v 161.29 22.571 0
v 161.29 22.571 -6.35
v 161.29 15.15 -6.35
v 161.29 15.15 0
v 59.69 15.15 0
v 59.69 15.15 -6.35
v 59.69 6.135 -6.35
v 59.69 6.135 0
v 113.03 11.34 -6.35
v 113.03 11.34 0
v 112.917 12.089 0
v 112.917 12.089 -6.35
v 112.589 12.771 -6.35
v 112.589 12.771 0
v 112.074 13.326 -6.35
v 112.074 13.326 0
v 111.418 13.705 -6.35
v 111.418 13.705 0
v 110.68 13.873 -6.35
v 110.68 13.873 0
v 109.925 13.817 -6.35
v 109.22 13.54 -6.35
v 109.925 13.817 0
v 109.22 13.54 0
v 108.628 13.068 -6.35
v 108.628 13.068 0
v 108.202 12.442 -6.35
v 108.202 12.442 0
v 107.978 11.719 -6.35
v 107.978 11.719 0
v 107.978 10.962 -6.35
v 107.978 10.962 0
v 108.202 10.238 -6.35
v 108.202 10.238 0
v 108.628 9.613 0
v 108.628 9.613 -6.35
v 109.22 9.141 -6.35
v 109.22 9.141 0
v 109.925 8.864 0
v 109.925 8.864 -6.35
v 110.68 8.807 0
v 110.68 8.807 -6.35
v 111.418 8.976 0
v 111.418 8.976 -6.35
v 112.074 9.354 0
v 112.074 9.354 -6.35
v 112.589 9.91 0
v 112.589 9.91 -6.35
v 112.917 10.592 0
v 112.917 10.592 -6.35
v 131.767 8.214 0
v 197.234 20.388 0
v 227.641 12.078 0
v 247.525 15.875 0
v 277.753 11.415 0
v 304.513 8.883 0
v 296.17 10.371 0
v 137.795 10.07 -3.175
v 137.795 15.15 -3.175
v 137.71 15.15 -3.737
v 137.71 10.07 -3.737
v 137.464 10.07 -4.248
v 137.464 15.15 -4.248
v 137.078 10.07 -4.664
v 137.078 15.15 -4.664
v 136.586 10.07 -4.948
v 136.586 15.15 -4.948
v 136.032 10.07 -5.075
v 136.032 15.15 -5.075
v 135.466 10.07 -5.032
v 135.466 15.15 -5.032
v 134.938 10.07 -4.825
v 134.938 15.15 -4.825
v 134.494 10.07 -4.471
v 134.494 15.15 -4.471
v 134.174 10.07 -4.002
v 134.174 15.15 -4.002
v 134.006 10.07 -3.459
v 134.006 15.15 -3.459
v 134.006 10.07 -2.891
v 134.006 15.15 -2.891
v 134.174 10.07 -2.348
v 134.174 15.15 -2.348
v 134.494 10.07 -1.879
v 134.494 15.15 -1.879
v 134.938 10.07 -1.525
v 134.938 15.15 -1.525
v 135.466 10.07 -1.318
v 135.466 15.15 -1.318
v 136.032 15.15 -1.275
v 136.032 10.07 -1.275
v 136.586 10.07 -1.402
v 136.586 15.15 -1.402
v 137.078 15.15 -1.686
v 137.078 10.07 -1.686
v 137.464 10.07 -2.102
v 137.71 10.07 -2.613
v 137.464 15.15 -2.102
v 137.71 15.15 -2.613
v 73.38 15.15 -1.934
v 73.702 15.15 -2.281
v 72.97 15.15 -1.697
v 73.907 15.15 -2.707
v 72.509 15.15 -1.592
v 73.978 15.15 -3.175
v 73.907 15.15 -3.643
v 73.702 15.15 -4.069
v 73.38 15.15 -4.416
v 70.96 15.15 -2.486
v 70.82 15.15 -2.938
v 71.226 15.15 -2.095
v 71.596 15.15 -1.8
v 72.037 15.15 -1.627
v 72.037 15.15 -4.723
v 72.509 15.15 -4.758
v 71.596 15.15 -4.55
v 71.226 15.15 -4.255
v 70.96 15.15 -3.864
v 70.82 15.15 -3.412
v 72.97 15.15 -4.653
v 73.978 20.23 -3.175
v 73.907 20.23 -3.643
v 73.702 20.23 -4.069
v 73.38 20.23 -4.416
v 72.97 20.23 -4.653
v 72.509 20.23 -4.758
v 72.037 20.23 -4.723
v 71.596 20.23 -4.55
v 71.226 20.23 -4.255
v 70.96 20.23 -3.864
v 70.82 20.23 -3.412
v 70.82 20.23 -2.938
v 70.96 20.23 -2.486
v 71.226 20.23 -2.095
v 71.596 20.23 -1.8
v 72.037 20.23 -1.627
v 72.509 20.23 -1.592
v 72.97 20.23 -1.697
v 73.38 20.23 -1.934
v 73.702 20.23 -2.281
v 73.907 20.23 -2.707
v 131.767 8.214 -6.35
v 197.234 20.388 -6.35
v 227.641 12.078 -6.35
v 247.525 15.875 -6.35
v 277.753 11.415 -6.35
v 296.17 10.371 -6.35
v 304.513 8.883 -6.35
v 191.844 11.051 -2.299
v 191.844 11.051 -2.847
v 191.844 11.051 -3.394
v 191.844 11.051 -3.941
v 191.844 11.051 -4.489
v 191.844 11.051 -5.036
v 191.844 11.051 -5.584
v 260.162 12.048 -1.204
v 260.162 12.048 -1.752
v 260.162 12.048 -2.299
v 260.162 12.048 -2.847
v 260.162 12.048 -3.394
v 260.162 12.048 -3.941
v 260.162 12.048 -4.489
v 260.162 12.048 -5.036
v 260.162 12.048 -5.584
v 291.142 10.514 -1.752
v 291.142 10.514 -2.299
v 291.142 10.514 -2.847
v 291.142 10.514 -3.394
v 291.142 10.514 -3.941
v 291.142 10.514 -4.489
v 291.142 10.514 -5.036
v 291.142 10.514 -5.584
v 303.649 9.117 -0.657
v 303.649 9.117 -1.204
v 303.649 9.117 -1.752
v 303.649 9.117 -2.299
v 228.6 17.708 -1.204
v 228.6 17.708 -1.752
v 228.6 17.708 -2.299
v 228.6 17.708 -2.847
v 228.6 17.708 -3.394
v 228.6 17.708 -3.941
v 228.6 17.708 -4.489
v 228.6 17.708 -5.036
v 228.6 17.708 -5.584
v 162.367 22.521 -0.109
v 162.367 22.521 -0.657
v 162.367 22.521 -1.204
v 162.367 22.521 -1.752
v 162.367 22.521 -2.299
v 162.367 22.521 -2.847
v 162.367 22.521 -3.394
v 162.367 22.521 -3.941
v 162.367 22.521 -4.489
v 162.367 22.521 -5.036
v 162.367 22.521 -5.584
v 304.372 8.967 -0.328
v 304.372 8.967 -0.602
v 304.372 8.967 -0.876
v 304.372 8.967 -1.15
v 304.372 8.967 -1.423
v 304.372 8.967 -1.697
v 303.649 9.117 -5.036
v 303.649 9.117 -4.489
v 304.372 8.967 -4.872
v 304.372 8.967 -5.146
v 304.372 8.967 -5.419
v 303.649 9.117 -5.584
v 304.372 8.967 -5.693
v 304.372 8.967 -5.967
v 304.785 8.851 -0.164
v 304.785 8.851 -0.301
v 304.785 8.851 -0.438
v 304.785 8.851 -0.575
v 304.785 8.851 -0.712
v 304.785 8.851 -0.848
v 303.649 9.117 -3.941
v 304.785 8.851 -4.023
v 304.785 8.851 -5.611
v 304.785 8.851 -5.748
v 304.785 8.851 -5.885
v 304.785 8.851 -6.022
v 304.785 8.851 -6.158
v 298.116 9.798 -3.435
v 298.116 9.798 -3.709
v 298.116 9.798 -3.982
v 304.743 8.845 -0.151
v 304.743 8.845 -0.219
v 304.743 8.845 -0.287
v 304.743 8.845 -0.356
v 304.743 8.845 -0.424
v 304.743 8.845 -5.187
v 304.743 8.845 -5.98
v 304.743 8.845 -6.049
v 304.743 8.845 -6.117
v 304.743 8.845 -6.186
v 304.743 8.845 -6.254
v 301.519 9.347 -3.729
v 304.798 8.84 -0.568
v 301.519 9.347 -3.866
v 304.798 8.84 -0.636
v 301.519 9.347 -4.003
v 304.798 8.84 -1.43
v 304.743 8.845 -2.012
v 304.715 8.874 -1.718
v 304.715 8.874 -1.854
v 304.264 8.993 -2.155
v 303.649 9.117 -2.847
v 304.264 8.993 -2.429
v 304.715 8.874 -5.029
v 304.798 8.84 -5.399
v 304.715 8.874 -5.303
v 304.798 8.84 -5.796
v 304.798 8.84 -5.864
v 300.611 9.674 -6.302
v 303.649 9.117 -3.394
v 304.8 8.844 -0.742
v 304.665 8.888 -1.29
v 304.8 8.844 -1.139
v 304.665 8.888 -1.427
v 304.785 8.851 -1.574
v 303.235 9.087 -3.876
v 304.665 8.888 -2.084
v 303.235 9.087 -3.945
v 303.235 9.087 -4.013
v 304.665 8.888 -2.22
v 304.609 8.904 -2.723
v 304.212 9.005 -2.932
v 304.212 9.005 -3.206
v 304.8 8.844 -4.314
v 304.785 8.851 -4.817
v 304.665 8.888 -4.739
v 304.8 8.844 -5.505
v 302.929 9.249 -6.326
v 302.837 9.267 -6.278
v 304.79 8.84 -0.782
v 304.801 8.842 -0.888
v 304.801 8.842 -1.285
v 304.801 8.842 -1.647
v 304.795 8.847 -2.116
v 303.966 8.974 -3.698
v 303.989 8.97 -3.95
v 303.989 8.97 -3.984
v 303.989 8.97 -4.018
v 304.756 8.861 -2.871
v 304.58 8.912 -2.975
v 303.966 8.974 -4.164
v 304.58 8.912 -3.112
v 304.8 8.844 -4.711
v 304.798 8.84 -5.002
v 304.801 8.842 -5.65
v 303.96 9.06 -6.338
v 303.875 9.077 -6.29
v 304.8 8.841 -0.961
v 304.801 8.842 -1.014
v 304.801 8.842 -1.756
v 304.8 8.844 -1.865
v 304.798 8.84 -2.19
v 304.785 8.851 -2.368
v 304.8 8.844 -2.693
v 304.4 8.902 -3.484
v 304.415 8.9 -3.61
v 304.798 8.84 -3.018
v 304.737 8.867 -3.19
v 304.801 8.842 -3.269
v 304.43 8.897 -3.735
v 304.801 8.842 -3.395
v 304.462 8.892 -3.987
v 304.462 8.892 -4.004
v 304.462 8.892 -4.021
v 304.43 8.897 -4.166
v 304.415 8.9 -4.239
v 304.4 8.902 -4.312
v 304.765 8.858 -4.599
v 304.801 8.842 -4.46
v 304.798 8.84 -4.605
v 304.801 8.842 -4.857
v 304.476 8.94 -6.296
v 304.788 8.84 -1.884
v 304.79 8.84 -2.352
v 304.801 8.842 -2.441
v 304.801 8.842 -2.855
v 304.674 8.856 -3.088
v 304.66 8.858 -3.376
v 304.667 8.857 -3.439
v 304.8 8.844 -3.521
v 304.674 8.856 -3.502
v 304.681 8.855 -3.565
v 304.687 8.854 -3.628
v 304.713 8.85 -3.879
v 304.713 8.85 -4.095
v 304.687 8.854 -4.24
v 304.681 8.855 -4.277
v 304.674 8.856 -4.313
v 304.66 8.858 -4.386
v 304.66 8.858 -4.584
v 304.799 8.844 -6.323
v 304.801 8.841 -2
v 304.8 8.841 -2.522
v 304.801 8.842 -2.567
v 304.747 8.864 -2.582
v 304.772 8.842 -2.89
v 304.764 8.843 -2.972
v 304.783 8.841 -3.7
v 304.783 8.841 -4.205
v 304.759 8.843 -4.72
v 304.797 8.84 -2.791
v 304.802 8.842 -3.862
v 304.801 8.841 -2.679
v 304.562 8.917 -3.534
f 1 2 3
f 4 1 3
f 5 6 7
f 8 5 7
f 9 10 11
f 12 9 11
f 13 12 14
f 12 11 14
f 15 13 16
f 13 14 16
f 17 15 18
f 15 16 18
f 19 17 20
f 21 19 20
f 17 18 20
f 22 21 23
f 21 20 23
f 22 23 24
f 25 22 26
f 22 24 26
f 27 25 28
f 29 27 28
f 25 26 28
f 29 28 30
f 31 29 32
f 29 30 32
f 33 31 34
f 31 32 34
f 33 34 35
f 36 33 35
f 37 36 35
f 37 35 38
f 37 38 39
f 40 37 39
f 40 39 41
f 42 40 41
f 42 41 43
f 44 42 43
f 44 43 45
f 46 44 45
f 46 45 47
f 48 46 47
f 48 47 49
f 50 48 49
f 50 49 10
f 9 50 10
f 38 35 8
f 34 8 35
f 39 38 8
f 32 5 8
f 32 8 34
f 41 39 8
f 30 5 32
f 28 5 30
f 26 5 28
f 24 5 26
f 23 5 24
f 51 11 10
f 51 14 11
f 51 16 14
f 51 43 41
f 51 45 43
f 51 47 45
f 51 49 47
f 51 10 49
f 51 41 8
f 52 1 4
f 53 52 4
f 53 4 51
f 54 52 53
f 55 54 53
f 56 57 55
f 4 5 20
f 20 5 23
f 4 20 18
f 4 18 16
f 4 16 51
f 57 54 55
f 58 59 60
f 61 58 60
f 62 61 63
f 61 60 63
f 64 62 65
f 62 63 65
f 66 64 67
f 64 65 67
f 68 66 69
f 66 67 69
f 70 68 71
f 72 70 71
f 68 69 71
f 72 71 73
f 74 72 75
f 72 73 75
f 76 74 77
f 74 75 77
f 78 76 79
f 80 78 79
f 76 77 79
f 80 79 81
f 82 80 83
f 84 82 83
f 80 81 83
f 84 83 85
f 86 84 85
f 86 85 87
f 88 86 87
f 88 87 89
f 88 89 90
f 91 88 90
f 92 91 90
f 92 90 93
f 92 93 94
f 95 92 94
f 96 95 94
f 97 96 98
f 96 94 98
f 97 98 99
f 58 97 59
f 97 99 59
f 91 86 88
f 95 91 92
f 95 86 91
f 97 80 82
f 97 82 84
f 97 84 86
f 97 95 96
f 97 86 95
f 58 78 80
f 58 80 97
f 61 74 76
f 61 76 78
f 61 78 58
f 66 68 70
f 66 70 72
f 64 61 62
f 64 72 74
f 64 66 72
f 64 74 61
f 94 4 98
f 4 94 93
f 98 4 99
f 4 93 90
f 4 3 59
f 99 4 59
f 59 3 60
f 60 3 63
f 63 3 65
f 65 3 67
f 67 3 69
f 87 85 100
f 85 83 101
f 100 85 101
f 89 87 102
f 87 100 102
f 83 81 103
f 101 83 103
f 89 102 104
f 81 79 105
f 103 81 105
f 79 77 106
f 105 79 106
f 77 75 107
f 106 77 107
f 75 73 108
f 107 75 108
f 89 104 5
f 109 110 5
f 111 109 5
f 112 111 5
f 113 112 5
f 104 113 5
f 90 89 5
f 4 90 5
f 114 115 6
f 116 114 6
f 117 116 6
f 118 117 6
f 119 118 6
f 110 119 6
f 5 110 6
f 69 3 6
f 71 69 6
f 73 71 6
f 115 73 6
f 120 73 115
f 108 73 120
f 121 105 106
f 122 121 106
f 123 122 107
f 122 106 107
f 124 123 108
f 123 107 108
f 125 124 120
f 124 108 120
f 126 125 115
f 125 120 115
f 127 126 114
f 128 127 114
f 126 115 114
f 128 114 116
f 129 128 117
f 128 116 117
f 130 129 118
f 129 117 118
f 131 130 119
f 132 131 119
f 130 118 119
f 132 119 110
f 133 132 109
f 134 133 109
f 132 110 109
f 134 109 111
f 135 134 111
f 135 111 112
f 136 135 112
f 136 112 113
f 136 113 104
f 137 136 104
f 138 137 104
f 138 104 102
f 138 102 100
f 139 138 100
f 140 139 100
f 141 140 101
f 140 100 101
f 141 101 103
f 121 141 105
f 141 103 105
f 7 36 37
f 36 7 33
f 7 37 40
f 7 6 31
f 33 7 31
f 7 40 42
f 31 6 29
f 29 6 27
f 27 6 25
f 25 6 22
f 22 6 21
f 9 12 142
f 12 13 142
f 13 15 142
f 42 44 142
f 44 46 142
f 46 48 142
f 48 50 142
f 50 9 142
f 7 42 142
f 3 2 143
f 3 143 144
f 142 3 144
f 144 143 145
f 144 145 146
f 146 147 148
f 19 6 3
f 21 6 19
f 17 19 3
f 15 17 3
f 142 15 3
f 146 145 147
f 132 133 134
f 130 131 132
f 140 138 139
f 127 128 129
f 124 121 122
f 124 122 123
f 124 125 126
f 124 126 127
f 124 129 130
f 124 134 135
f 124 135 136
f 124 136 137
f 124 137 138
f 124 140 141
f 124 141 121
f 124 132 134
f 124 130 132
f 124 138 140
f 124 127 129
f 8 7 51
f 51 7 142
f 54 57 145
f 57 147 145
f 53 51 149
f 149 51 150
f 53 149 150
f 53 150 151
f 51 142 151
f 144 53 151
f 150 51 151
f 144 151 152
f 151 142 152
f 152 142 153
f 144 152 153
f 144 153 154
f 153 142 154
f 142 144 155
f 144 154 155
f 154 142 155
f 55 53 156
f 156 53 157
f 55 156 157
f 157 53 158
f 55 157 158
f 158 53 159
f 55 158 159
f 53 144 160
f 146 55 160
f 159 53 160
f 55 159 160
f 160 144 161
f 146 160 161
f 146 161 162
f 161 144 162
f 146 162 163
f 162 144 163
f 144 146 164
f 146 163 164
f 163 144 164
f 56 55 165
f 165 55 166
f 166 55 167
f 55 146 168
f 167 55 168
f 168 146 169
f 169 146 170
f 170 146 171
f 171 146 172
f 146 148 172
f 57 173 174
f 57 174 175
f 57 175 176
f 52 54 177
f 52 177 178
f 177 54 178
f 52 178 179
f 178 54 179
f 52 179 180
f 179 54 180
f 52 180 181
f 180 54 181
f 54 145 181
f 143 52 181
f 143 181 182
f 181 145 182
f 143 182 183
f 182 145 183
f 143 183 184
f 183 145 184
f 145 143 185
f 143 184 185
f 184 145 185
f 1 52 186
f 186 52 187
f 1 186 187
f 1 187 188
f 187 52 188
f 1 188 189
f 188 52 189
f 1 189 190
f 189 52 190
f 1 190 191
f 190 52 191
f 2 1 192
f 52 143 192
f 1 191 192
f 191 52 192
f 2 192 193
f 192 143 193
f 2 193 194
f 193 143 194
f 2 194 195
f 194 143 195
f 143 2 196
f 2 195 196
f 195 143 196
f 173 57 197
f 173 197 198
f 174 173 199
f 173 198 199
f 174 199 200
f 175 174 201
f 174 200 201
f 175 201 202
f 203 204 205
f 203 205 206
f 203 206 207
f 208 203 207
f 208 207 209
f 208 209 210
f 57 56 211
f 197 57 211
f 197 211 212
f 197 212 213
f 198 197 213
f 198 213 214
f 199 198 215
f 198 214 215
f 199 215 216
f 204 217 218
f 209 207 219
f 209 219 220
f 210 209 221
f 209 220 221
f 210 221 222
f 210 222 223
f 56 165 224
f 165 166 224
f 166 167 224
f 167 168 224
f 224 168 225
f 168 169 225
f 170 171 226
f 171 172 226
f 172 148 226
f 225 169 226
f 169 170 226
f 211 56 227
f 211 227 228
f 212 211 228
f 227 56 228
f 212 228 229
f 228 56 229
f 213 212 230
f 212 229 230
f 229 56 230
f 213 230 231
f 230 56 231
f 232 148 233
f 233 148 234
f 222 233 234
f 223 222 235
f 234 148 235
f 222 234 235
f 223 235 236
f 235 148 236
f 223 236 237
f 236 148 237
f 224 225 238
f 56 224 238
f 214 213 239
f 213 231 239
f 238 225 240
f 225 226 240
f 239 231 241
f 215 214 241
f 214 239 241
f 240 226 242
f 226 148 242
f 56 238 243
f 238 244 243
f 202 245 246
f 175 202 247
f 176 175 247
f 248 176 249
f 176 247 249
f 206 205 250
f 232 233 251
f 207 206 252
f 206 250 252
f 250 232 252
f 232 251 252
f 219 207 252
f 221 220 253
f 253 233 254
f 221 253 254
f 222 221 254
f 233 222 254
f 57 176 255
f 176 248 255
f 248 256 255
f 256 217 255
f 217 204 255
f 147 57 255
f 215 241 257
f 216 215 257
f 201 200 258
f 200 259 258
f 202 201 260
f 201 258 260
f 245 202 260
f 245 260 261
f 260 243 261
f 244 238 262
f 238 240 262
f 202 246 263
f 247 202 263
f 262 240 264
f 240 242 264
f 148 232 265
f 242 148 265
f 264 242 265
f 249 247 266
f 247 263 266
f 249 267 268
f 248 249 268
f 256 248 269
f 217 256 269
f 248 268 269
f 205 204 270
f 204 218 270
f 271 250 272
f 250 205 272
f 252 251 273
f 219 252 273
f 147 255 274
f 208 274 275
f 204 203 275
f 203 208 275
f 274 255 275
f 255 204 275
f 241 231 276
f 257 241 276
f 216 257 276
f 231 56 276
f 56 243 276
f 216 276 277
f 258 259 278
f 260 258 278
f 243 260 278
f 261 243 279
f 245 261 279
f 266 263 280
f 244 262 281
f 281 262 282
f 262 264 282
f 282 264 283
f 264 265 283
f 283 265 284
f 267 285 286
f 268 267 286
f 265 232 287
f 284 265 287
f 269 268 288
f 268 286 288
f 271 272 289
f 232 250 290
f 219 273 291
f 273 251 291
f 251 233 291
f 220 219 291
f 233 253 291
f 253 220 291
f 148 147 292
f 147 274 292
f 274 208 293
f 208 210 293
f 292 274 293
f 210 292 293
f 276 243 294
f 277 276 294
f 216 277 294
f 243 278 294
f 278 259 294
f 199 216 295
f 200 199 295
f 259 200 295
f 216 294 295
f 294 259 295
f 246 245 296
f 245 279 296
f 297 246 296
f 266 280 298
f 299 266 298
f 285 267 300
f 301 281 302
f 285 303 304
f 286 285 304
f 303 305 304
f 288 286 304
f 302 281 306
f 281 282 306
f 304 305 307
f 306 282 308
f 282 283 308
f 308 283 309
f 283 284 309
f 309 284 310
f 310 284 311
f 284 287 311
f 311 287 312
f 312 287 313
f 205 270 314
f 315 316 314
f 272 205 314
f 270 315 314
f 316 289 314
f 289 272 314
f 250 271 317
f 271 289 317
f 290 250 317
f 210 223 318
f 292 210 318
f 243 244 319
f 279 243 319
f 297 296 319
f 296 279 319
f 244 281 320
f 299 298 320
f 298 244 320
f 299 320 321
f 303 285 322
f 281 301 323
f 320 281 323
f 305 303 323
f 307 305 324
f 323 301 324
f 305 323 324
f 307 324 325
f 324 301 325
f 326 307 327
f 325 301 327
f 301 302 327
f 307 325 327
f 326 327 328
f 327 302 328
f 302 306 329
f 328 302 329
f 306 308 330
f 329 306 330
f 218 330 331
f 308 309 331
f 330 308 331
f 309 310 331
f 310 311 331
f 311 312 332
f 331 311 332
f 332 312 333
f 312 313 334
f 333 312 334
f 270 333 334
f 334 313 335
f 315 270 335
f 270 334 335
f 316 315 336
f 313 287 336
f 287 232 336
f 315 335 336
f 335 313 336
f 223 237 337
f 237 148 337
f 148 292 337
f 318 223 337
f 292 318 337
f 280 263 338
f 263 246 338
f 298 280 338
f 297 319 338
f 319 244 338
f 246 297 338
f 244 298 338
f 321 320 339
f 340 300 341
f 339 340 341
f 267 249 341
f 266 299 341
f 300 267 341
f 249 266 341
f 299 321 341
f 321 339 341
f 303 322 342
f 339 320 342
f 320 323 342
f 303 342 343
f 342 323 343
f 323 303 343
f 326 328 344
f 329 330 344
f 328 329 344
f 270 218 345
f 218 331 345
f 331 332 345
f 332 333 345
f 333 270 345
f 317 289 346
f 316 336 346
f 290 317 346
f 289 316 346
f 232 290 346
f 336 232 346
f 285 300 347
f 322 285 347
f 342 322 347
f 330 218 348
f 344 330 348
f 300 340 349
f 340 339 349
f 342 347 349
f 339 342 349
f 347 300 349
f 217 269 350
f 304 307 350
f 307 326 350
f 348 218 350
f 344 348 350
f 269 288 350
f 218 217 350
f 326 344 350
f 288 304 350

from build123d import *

# Parameters (mm, degrees)
STOCK_BASE_START            = -6.35
STOCK_BASE_RIB_BODY_1_DEPTH = 6.35
BOSS_EXTRUDE1_DEPTH         = 5.08
CUT_EXTRUDE1_DEPTH          = 5.08
SKETCH2_R                   = 2.54
CUT_EXTRUDE2_DEPTH          = 306.702054727


# Read off the part's stored shape, not the designer's step: Stock-Base rib body-1
with BuildPart() as part:
    # Stock-Base rib body-1 outline → Stock-Base rib body-1 (new body)
    with BuildSketch(Plane.XY.offset(STOCK_BASE_START)):
        with BuildLine():
            Line((161.289999981, 22.571350716), (161.29, 15.150340758))
            Line((161.29, 15.150340758), (59.69, 15.150340758))
            Line((59.69, 15.150340758), (59.69, 6.134698498))
            add(Edge.make_bspline(
                [(59.69, 6.134698498), (62.370101804, 6.160023518), (67.877452262, 6.182447157), (76.307956217, 6.373158096), (85.09907939, 6.509442243), (94.162943379, 6.79146182), (103.491777789, 7.043168657), (113.013413145, 7.422019176), (122.717663004, 7.796869995), (132.538395015, 8.249196415), (142.452771402, 8.707918686), (152.399232196, 9.217154004), (162.351098417, 9.713525096), (172.257801894, 10.203694877), (182.087133464, 10.637497333), (191.780226111, 11.062313384), (201.314005616, 11.398588689), (210.630363502, 11.71219288), (219.704890932, 11.928662407), (228.487751662, 12.105474427), (236.947100219, 12.195438631), (245.043170333, 12.229158657), (252.742806253, 12.181946241), (260.013825454, 12.064770152), (266.8235427, 11.878977654), (273.14344318, 11.644203577), (278.944519004, 11.361273095), (284.206358459, 11.050038473), (288.903664519, 10.712343504), (293.017371724, 10.353180028), (296.521945453, 9.997313173), (299.426457428, 9.637189525), (301.630485972, 9.338036313), (303.370853204, 9.064651021), (304.119516082, 8.951899031), (304.782946498, 8.835953449), (304.8, 8.840705219), (304.82012511, 8.84631286), (304.136800475, 9.039024801), (303.375322868, 9.156226676), (301.636958583, 9.507509775), (299.426767543, 9.869463422), (296.518953252, 10.328013797), (293.018467792, 10.824800612), (288.900536795, 11.360444608), (284.204885436, 11.935014904), (278.940836996, 12.542405848), (273.143680748, 13.196668182), (266.817821912, 13.87258495), (260.019791182, 14.607535084), (252.741163128, 15.343048003), (245.055559941, 16.131641074), (236.946583275, 16.900491852), (228.508068346, 17.731071309), (219.707729735, 18.508351891), (210.662190304, 19.341207583), (201.320827802, 20.063479603), (191.814362749, 20.822556875), (182.095576055, 21.436953514), (172.287559077, 22.067269015), (165.318927668, 22.384131376), (161.648984481, 22.55467852), (161.289999981, 22.571350716)],
                knots=[0.608211552, 0.608211552, 0.608211552, 0.608211552, 0.620979222, 0.634441734, 0.648424207, 0.662880137, 0.677739163, 0.692957281, 0.708452453, 0.724176515, 0.740041984, 0.755990469, 0.771938353, 0.787811294, 0.803535896, 0.819040498, 0.834255058, 0.849121195, 0.863570137, 0.877552378, 0.891006016, 0.903874255, 0.916114356, 0.927680384, 0.938530909, 0.948621564, 0.957908587, 0.966363629, 0.97395265, 0.980639895, 0.986402983, 0.99120656, 0.995011197, 0.997773026, 0.999447193, 1, 1, 1, 1.000652376, 1.002403448, 1.005256568, 1.009165764, 1.014096751, 1.020022012, 1.026896344, 1.034706383, 1.043414458, 1.05299002, 1.063396809, 1.074601254, 1.08653103, 1.0991543, 1.112392946, 1.126224492, 1.140544889, 1.155318673, 1.170431652, 1.185859272, 1.201486855, 1.217293377, 1.233167489, 1.234888603, 1.234888603, 1.234888603, 1.234888603], degree=3))
        make_face()
    extrude(amount=STOCK_BASE_RIB_BODY_1_DEPTH)

    # Sketch1 → Boss-Extrude1 (add)
    with BuildSketch(Plane(origin=(0, 15.150340758, 0), x_dir=(1, 0, 0), z_dir=(0, 1, 0))):
        with BuildLine():
            ThreePointArc((70.8025, 3.175), (72.39, 1.5875), (73.9775, 3.175))
            Line((73.9775, 3.175), (70.8025, 3.175))
        make_face()
        with BuildLine():
            Line((70.8025, 3.175), (73.9775, 3.175))
            ThreePointArc((73.9775, 3.175), (72.39, 4.7625), (70.8025, 3.175))
        make_face()
    extrude(amount=BOSS_EXTRUDE1_DEPTH)

    # Sketch1<3> → Cut-Extrude1 (cut)
    with BuildSketch(Plane(origin=(0, 15.150340758, 0), x_dir=(1, 0, 0), z_dir=(0, 1, 0))):
        with BuildLine():
            ThreePointArc((133.985, 3.175), (135.89, 1.27), (137.795, 3.175))
            Line((137.795, 3.175), (133.985, 3.175))
        make_face()
        with BuildLine():
            Line((133.985, 3.175), (137.795, 3.175))
            ThreePointArc((137.795, 3.175), (135.89, 5.08), (133.985, 3.175))
        make_face()
    extrude(amount=-CUT_EXTRUDE1_DEPTH, mode=Mode.SUBTRACT)

    # Sketch2 → Cut-Extrude2 (cut, through all)
    with BuildSketch(Plane.XY):
        with Locations((110.49, 11.340340758)):
            Circle(SKETCH2_R)
    extrude(amount=-CUT_EXTRUDE2_DEPTH, mode=Mode.SUBTRACT)


solid = part.part
